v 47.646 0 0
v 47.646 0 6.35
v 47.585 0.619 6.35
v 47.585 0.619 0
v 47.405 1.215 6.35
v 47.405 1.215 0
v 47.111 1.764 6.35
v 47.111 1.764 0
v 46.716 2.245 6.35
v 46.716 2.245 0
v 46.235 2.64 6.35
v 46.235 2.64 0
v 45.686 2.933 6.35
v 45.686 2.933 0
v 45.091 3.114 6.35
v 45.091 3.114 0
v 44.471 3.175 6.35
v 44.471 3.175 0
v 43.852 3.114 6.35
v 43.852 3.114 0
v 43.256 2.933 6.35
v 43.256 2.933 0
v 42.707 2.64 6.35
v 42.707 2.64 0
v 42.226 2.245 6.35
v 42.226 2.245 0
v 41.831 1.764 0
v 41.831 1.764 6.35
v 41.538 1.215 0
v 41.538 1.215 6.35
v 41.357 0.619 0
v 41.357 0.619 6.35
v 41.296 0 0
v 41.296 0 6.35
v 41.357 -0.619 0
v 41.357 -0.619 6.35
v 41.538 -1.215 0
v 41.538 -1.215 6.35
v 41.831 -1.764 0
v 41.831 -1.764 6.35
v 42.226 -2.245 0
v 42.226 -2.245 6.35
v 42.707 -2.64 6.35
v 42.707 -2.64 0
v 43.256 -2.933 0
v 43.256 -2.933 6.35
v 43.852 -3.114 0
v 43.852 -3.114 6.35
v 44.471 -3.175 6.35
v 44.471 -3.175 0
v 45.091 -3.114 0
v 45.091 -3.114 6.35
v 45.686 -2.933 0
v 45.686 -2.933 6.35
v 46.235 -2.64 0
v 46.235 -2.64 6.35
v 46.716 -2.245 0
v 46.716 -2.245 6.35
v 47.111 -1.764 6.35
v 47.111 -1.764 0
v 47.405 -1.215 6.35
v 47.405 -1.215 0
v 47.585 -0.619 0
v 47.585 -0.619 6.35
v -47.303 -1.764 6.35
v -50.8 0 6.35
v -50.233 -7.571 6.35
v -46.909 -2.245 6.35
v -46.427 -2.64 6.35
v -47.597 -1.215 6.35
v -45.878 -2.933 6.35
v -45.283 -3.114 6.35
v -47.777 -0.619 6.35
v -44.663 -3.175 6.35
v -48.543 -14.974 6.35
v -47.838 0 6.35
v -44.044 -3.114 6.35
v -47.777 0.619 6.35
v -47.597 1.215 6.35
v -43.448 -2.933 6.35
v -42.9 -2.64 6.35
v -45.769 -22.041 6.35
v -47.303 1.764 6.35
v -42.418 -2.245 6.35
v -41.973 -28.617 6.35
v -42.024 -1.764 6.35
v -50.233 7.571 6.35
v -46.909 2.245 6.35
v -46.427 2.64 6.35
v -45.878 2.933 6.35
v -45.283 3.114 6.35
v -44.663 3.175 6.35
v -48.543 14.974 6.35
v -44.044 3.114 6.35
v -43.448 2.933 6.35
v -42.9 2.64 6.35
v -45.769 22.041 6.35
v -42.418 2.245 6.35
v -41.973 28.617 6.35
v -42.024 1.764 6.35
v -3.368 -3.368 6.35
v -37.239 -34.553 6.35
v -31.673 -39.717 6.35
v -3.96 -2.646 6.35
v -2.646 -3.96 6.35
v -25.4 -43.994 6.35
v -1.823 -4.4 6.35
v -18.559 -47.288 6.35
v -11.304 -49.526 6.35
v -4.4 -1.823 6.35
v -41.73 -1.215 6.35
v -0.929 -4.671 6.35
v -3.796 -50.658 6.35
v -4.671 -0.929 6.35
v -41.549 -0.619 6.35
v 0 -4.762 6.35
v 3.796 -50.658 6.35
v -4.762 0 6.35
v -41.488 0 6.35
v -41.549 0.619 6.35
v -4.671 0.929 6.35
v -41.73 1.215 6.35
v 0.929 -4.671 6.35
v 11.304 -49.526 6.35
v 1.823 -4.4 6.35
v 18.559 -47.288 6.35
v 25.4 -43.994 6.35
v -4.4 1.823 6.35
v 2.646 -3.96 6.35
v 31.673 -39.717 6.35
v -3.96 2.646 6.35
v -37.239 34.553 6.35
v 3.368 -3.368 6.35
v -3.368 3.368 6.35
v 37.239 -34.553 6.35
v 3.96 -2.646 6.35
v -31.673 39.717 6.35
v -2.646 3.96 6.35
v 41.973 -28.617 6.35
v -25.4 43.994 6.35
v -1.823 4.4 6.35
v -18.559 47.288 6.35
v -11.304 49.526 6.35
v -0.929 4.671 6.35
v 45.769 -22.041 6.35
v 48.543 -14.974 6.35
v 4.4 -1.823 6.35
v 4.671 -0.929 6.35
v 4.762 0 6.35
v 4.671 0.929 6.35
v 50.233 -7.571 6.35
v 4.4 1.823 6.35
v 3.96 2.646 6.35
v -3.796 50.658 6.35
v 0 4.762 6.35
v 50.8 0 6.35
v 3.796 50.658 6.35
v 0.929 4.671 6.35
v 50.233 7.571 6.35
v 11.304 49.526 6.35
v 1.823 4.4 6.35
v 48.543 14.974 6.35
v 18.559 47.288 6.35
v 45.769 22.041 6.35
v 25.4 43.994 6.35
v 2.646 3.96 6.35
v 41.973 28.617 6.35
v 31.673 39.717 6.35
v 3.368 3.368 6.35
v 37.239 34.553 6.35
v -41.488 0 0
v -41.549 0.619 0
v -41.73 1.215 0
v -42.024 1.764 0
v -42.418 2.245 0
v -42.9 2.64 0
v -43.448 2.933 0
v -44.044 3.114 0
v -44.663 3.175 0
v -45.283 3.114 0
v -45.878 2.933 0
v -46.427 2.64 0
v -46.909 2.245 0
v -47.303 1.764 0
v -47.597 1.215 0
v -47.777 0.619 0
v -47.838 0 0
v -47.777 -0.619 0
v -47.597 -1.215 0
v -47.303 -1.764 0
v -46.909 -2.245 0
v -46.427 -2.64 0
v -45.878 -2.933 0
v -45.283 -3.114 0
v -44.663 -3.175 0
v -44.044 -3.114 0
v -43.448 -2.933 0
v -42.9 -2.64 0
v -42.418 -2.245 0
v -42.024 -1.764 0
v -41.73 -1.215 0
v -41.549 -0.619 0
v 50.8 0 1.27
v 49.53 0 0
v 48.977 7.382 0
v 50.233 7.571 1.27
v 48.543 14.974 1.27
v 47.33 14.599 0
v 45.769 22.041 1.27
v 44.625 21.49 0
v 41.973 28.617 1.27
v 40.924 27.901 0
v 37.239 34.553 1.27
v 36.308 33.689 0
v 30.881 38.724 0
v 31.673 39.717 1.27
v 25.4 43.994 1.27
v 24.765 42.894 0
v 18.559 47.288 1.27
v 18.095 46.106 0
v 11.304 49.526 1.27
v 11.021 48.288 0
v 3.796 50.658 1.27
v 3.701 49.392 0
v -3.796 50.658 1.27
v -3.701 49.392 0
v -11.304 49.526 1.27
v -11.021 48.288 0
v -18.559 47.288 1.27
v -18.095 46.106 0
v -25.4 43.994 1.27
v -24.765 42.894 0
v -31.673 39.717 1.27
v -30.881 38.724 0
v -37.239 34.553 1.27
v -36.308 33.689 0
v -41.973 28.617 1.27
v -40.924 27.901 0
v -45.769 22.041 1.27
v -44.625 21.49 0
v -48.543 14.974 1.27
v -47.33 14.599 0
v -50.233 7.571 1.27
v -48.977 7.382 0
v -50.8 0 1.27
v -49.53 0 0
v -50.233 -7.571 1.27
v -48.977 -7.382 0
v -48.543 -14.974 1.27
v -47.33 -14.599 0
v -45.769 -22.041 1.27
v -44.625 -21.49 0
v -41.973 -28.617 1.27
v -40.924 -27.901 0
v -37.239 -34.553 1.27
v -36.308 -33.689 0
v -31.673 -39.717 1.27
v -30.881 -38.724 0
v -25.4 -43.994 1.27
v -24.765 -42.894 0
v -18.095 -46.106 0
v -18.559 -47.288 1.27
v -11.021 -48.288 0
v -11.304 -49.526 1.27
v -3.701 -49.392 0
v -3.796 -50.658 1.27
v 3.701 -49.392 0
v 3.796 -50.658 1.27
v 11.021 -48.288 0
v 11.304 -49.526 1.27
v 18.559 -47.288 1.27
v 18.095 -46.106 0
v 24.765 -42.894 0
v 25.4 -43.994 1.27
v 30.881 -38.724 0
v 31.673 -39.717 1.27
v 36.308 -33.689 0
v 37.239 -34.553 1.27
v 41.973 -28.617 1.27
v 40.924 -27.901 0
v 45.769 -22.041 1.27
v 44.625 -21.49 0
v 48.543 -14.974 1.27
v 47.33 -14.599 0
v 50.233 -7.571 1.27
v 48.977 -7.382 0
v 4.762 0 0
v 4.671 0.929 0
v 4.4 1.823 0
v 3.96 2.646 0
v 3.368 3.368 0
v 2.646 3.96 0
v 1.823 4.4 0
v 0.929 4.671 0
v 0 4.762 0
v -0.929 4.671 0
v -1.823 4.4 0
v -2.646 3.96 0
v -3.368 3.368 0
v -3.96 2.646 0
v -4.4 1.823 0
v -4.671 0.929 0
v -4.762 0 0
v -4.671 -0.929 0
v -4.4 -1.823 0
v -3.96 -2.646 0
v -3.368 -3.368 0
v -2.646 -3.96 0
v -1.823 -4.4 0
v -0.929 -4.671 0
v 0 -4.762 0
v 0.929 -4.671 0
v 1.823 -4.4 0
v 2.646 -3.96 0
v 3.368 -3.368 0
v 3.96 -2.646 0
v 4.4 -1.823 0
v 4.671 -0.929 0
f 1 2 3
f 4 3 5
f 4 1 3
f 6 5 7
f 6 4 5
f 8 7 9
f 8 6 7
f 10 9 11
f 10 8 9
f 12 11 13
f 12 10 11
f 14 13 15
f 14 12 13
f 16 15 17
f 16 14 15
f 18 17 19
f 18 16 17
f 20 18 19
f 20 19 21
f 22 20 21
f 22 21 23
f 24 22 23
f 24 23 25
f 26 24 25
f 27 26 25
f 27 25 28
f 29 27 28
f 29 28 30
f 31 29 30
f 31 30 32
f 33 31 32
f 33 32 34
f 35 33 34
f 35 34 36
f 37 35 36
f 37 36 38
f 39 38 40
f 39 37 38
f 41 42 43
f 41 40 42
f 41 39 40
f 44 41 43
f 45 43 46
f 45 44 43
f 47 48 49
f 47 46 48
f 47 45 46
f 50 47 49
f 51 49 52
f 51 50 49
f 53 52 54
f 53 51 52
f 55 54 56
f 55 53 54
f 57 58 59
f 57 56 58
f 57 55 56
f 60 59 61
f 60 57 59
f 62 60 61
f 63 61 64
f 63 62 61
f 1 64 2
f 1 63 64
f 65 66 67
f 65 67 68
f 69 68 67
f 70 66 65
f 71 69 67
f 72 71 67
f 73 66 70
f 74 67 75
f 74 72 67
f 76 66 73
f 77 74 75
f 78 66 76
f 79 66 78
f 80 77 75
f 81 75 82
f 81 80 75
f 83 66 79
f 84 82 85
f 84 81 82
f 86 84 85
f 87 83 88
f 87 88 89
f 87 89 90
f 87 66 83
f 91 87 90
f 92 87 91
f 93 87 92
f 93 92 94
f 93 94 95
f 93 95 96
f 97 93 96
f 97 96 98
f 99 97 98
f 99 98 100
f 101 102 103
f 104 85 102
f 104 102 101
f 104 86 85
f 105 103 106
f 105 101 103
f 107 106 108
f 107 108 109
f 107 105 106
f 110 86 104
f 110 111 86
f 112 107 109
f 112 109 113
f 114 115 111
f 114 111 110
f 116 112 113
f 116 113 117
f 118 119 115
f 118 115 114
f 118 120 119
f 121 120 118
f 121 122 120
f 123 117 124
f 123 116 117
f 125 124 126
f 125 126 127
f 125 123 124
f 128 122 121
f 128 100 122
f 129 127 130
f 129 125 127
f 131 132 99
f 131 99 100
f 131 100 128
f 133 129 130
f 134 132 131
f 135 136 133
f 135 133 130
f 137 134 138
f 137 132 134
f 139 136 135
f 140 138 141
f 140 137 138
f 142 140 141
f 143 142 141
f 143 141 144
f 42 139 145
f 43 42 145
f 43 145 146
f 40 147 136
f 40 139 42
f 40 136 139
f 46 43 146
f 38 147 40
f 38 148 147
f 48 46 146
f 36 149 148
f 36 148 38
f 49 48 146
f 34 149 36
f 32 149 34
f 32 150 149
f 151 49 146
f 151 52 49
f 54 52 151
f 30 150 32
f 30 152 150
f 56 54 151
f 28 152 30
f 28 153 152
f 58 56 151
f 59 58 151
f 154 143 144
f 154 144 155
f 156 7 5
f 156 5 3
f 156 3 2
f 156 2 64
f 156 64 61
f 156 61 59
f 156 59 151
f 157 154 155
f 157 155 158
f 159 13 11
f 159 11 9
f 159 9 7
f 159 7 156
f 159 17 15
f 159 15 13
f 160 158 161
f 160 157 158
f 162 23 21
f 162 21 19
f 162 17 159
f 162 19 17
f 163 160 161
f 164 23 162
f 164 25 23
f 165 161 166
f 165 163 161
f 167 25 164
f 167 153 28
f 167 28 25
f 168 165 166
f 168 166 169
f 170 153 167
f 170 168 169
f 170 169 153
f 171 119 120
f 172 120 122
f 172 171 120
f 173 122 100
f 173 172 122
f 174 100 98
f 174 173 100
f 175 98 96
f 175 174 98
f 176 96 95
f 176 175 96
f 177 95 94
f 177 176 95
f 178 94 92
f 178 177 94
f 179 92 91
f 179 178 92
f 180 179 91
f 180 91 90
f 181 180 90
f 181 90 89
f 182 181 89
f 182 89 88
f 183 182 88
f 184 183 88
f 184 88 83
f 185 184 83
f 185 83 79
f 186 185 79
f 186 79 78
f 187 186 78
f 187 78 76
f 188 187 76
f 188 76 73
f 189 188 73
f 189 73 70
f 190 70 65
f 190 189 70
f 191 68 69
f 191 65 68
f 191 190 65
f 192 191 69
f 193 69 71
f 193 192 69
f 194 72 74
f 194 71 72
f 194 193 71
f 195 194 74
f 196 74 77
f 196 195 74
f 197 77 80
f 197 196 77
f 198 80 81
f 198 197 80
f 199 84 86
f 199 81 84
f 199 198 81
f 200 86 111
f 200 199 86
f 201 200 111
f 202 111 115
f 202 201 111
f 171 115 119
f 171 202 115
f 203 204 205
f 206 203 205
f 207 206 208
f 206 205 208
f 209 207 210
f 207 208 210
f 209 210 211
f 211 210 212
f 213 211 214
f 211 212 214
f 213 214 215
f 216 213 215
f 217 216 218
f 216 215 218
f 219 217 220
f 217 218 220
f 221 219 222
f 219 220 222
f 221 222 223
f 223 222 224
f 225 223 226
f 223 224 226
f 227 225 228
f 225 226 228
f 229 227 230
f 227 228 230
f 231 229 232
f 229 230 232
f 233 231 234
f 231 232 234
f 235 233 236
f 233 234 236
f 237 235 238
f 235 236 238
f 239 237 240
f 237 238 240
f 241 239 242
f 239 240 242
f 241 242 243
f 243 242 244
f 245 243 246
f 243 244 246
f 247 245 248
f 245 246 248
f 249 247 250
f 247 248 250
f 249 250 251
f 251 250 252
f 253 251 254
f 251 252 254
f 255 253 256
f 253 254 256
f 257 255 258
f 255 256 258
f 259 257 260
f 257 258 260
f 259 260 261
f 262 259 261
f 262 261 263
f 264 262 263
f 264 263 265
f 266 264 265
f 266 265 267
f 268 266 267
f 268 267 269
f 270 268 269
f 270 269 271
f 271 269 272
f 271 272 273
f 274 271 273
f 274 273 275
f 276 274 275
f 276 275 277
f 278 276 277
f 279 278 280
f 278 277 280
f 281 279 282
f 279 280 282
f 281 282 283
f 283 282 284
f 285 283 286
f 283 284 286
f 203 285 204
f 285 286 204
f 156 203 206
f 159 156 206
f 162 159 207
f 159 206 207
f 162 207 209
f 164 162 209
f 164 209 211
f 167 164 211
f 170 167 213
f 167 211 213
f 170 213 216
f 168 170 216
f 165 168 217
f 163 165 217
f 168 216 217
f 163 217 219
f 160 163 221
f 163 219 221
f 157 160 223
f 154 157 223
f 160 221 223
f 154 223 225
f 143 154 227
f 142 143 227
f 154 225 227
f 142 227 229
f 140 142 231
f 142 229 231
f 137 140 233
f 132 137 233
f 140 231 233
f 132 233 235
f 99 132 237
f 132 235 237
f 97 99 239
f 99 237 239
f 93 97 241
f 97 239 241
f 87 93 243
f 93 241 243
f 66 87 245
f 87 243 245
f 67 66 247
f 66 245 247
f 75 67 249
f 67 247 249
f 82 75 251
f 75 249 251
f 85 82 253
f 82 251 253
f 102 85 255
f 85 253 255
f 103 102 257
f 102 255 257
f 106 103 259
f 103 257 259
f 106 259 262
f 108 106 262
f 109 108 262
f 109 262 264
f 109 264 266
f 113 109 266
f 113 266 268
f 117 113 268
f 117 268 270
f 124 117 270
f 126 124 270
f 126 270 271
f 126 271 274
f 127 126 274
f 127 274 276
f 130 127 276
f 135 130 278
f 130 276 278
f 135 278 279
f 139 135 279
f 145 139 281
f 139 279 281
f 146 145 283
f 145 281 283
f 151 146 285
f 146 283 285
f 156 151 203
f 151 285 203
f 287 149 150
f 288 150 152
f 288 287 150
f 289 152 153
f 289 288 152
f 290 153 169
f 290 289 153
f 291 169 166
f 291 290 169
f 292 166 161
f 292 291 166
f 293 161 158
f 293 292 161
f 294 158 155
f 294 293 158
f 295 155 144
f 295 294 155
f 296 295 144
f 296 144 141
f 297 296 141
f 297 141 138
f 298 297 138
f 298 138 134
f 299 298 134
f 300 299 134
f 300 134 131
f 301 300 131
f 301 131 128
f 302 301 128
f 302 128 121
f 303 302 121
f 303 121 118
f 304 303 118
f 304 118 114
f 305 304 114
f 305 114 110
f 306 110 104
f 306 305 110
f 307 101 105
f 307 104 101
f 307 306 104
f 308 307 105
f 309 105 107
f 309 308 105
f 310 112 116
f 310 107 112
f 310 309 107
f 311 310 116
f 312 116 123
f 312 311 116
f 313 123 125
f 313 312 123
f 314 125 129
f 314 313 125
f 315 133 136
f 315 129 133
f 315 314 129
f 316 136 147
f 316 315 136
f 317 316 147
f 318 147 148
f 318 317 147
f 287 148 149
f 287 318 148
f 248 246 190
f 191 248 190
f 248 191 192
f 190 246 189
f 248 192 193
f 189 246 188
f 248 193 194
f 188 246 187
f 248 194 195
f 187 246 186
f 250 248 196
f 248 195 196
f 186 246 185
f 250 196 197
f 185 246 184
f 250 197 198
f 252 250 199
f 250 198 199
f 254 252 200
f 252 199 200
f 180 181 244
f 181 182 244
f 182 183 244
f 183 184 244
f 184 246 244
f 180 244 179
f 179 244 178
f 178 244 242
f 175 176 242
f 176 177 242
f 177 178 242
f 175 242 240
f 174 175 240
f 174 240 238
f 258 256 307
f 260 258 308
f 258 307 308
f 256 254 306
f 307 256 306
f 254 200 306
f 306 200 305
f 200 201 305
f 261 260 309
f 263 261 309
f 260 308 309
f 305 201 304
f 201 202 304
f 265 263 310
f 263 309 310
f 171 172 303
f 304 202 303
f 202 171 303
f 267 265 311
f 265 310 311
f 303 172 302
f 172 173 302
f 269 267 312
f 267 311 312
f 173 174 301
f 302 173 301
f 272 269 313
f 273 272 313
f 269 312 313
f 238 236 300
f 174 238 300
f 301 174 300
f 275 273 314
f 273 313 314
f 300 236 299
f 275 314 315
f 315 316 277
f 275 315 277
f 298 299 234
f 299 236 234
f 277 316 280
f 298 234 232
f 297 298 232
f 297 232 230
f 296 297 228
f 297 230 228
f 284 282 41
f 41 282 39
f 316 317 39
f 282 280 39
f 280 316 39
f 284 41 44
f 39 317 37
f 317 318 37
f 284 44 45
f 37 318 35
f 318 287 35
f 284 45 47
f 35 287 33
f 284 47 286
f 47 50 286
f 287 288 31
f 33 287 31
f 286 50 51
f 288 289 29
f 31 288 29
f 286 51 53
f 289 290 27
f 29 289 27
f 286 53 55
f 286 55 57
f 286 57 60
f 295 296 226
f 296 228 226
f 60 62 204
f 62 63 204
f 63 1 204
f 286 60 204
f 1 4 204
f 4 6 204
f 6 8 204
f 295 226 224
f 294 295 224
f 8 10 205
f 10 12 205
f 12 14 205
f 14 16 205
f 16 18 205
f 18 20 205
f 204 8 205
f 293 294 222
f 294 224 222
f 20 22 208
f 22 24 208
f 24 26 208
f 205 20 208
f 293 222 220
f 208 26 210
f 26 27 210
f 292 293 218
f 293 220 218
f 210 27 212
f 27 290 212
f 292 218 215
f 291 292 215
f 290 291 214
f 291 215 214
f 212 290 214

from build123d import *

# Parameters (mm, degrees)
F0_R     = 50.8
F1_DEPTH = 6.35
F2_R     = 4.7625
F2_R_2   = 3.175
F3_DEPTH = 25.4
F4_SIZE  = 1.27


# Not quite as in the source:
# - a length typed as a fraction of an inch, garbled in the dataset ("3 / 203.2 mm" for 3/8 in), is restored


with BuildPart() as f1:
    # F0 (on Top) → F1 (new body)
    with BuildSketch(Plane.XY):
        Circle(F0_R)
    extrude(amount=F1_DEPTH)

    # F2 (on Top) → F3 (cut)
    with BuildSketch(Plane.XY):
        Circle(F2_R)
        with Locations((-44.6634478867, 0)):
            Circle(F2_R_2)
        with Locations((44.4713458419, 0)):
            Circle(F2_R_2)
    extrude(amount=F3_DEPTH, mode=Mode.SUBTRACT)

    # F4
    f4_edges = [f1.edges().sort_by_distance(p)[0] for p in [
        (-50.8, 0, 0),
    ]]
    chamfer(f4_edges, length=F4_SIZE)


solid = f1.part
